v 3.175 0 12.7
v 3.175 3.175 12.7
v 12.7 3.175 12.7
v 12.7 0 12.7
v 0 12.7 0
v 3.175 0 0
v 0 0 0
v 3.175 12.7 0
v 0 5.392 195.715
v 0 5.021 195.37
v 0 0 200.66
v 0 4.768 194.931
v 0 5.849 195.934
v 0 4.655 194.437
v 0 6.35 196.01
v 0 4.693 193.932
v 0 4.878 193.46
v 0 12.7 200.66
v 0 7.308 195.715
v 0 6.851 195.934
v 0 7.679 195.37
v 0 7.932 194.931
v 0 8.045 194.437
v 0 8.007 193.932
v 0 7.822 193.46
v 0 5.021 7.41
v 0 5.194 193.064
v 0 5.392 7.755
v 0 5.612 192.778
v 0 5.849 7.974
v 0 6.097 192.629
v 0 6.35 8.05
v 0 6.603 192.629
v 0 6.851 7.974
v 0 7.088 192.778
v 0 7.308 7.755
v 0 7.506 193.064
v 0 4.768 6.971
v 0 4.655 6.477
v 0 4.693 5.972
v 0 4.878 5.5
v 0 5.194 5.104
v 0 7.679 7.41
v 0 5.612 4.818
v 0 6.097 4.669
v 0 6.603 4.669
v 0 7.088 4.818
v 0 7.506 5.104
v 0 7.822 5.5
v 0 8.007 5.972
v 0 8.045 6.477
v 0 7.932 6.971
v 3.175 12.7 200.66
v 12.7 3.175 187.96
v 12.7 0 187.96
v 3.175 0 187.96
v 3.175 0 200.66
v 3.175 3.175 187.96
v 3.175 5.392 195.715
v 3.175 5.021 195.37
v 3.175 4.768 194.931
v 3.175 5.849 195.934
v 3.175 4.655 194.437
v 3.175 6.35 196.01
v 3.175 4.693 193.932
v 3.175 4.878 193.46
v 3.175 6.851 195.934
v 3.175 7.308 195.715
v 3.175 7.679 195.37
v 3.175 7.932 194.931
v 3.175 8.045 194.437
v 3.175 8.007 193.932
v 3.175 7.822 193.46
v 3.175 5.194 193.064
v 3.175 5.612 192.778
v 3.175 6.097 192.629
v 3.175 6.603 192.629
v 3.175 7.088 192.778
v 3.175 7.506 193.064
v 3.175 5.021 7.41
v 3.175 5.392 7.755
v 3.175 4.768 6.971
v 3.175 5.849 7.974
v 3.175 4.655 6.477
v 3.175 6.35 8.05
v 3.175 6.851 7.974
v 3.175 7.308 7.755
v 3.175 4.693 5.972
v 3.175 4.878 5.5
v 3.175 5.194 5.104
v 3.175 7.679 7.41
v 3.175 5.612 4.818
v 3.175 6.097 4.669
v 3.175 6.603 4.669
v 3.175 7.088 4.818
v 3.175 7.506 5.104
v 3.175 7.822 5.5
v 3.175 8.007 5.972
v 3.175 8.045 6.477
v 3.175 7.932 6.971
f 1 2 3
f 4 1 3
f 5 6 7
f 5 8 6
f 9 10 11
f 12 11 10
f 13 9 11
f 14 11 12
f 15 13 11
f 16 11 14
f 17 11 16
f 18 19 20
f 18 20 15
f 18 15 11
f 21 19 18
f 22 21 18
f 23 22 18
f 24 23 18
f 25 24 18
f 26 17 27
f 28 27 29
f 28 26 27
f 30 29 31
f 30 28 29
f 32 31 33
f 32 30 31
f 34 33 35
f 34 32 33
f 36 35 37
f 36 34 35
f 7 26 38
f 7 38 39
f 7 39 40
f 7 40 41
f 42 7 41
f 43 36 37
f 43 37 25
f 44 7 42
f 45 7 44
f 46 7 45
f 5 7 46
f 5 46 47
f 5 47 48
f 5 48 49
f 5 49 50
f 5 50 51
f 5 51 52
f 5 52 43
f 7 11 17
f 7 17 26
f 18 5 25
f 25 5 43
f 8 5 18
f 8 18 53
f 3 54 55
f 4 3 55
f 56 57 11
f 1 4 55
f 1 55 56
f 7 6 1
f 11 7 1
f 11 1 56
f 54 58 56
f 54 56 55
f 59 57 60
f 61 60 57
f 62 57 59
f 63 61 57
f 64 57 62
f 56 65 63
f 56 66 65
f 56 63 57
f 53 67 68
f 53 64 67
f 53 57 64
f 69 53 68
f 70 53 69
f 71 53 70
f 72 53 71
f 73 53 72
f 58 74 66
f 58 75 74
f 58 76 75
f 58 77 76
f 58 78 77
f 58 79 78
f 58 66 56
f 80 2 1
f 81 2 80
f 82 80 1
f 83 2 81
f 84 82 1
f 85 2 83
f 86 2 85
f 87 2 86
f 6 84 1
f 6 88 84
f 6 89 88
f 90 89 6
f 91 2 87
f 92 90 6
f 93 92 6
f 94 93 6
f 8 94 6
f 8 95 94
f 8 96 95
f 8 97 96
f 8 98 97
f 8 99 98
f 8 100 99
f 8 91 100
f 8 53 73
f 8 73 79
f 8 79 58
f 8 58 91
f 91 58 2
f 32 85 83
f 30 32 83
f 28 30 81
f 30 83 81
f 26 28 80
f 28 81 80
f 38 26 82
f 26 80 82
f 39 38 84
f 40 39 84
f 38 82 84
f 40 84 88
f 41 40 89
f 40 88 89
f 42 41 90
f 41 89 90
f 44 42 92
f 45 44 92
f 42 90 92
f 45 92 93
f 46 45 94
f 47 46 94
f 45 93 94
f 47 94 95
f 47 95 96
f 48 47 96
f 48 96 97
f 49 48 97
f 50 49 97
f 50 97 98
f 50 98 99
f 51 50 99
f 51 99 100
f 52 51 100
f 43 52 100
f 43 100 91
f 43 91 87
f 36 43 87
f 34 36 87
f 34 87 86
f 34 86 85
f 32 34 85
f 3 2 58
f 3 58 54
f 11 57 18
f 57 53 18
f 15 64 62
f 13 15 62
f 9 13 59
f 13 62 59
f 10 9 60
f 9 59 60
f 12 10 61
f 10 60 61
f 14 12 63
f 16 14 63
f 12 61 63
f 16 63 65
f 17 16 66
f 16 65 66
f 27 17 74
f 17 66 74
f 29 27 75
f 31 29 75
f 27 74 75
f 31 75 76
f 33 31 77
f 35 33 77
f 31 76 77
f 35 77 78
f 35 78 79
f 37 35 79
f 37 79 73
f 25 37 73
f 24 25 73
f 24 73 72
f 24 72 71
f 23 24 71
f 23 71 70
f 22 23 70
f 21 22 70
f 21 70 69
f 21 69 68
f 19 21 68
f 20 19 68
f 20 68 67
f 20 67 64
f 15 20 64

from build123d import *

# Parameters (mm, degrees)
BOSS_EXTRUDE1_DEPTH  = 200.66
SKETCH2_W            = 9.525
SKETCH2_H            = 12.7
CUT_EXTRUDE1_DEPTH   = 4.175
M3_CLEARANCE_HOLE1_D = 3.4


with BuildPart() as part:
    # Sketch1 → Boss-Extrude1 (new body)
    with BuildSketch(Plane.XY):
        Polygon((0, 0), (0, 12.7), (3.175, 12.7), (3.175, 3.175), (12.7, 3.175), (12.7, 0), align=None)
    extrude(amount=BOSS_EXTRUDE1_DEPTH)

    # Sketch2 → Cut-Extrude1 (cut, through all)
    with BuildSketch(Plane(origin=(0, 3.175, 0), x_dir=(1, 0, 0), z_dir=(0, 1, 0))):
        with Locations((7.9375, -6.35)):
            Rectangle(SKETCH2_W, SKETCH2_H)
        with Locations((7.9375, -194.31)):
            Rectangle(SKETCH2_W, SKETCH2_H)
    extrude(amount=-CUT_EXTRUDE1_DEPTH, mode=Mode.SUBTRACT)

    # M3 Clearance Hole1 (through all)
    with Locations(Plane(origin=(0, 6.35, 6.35), x_dir=(0, 0, -1), z_dir=(-1, 0, 0))):
        with Locations((0, 0), (-187.96, 0)):
            Hole(M3_CLEARANCE_HOLE1_D / 2)


solid = part.part
